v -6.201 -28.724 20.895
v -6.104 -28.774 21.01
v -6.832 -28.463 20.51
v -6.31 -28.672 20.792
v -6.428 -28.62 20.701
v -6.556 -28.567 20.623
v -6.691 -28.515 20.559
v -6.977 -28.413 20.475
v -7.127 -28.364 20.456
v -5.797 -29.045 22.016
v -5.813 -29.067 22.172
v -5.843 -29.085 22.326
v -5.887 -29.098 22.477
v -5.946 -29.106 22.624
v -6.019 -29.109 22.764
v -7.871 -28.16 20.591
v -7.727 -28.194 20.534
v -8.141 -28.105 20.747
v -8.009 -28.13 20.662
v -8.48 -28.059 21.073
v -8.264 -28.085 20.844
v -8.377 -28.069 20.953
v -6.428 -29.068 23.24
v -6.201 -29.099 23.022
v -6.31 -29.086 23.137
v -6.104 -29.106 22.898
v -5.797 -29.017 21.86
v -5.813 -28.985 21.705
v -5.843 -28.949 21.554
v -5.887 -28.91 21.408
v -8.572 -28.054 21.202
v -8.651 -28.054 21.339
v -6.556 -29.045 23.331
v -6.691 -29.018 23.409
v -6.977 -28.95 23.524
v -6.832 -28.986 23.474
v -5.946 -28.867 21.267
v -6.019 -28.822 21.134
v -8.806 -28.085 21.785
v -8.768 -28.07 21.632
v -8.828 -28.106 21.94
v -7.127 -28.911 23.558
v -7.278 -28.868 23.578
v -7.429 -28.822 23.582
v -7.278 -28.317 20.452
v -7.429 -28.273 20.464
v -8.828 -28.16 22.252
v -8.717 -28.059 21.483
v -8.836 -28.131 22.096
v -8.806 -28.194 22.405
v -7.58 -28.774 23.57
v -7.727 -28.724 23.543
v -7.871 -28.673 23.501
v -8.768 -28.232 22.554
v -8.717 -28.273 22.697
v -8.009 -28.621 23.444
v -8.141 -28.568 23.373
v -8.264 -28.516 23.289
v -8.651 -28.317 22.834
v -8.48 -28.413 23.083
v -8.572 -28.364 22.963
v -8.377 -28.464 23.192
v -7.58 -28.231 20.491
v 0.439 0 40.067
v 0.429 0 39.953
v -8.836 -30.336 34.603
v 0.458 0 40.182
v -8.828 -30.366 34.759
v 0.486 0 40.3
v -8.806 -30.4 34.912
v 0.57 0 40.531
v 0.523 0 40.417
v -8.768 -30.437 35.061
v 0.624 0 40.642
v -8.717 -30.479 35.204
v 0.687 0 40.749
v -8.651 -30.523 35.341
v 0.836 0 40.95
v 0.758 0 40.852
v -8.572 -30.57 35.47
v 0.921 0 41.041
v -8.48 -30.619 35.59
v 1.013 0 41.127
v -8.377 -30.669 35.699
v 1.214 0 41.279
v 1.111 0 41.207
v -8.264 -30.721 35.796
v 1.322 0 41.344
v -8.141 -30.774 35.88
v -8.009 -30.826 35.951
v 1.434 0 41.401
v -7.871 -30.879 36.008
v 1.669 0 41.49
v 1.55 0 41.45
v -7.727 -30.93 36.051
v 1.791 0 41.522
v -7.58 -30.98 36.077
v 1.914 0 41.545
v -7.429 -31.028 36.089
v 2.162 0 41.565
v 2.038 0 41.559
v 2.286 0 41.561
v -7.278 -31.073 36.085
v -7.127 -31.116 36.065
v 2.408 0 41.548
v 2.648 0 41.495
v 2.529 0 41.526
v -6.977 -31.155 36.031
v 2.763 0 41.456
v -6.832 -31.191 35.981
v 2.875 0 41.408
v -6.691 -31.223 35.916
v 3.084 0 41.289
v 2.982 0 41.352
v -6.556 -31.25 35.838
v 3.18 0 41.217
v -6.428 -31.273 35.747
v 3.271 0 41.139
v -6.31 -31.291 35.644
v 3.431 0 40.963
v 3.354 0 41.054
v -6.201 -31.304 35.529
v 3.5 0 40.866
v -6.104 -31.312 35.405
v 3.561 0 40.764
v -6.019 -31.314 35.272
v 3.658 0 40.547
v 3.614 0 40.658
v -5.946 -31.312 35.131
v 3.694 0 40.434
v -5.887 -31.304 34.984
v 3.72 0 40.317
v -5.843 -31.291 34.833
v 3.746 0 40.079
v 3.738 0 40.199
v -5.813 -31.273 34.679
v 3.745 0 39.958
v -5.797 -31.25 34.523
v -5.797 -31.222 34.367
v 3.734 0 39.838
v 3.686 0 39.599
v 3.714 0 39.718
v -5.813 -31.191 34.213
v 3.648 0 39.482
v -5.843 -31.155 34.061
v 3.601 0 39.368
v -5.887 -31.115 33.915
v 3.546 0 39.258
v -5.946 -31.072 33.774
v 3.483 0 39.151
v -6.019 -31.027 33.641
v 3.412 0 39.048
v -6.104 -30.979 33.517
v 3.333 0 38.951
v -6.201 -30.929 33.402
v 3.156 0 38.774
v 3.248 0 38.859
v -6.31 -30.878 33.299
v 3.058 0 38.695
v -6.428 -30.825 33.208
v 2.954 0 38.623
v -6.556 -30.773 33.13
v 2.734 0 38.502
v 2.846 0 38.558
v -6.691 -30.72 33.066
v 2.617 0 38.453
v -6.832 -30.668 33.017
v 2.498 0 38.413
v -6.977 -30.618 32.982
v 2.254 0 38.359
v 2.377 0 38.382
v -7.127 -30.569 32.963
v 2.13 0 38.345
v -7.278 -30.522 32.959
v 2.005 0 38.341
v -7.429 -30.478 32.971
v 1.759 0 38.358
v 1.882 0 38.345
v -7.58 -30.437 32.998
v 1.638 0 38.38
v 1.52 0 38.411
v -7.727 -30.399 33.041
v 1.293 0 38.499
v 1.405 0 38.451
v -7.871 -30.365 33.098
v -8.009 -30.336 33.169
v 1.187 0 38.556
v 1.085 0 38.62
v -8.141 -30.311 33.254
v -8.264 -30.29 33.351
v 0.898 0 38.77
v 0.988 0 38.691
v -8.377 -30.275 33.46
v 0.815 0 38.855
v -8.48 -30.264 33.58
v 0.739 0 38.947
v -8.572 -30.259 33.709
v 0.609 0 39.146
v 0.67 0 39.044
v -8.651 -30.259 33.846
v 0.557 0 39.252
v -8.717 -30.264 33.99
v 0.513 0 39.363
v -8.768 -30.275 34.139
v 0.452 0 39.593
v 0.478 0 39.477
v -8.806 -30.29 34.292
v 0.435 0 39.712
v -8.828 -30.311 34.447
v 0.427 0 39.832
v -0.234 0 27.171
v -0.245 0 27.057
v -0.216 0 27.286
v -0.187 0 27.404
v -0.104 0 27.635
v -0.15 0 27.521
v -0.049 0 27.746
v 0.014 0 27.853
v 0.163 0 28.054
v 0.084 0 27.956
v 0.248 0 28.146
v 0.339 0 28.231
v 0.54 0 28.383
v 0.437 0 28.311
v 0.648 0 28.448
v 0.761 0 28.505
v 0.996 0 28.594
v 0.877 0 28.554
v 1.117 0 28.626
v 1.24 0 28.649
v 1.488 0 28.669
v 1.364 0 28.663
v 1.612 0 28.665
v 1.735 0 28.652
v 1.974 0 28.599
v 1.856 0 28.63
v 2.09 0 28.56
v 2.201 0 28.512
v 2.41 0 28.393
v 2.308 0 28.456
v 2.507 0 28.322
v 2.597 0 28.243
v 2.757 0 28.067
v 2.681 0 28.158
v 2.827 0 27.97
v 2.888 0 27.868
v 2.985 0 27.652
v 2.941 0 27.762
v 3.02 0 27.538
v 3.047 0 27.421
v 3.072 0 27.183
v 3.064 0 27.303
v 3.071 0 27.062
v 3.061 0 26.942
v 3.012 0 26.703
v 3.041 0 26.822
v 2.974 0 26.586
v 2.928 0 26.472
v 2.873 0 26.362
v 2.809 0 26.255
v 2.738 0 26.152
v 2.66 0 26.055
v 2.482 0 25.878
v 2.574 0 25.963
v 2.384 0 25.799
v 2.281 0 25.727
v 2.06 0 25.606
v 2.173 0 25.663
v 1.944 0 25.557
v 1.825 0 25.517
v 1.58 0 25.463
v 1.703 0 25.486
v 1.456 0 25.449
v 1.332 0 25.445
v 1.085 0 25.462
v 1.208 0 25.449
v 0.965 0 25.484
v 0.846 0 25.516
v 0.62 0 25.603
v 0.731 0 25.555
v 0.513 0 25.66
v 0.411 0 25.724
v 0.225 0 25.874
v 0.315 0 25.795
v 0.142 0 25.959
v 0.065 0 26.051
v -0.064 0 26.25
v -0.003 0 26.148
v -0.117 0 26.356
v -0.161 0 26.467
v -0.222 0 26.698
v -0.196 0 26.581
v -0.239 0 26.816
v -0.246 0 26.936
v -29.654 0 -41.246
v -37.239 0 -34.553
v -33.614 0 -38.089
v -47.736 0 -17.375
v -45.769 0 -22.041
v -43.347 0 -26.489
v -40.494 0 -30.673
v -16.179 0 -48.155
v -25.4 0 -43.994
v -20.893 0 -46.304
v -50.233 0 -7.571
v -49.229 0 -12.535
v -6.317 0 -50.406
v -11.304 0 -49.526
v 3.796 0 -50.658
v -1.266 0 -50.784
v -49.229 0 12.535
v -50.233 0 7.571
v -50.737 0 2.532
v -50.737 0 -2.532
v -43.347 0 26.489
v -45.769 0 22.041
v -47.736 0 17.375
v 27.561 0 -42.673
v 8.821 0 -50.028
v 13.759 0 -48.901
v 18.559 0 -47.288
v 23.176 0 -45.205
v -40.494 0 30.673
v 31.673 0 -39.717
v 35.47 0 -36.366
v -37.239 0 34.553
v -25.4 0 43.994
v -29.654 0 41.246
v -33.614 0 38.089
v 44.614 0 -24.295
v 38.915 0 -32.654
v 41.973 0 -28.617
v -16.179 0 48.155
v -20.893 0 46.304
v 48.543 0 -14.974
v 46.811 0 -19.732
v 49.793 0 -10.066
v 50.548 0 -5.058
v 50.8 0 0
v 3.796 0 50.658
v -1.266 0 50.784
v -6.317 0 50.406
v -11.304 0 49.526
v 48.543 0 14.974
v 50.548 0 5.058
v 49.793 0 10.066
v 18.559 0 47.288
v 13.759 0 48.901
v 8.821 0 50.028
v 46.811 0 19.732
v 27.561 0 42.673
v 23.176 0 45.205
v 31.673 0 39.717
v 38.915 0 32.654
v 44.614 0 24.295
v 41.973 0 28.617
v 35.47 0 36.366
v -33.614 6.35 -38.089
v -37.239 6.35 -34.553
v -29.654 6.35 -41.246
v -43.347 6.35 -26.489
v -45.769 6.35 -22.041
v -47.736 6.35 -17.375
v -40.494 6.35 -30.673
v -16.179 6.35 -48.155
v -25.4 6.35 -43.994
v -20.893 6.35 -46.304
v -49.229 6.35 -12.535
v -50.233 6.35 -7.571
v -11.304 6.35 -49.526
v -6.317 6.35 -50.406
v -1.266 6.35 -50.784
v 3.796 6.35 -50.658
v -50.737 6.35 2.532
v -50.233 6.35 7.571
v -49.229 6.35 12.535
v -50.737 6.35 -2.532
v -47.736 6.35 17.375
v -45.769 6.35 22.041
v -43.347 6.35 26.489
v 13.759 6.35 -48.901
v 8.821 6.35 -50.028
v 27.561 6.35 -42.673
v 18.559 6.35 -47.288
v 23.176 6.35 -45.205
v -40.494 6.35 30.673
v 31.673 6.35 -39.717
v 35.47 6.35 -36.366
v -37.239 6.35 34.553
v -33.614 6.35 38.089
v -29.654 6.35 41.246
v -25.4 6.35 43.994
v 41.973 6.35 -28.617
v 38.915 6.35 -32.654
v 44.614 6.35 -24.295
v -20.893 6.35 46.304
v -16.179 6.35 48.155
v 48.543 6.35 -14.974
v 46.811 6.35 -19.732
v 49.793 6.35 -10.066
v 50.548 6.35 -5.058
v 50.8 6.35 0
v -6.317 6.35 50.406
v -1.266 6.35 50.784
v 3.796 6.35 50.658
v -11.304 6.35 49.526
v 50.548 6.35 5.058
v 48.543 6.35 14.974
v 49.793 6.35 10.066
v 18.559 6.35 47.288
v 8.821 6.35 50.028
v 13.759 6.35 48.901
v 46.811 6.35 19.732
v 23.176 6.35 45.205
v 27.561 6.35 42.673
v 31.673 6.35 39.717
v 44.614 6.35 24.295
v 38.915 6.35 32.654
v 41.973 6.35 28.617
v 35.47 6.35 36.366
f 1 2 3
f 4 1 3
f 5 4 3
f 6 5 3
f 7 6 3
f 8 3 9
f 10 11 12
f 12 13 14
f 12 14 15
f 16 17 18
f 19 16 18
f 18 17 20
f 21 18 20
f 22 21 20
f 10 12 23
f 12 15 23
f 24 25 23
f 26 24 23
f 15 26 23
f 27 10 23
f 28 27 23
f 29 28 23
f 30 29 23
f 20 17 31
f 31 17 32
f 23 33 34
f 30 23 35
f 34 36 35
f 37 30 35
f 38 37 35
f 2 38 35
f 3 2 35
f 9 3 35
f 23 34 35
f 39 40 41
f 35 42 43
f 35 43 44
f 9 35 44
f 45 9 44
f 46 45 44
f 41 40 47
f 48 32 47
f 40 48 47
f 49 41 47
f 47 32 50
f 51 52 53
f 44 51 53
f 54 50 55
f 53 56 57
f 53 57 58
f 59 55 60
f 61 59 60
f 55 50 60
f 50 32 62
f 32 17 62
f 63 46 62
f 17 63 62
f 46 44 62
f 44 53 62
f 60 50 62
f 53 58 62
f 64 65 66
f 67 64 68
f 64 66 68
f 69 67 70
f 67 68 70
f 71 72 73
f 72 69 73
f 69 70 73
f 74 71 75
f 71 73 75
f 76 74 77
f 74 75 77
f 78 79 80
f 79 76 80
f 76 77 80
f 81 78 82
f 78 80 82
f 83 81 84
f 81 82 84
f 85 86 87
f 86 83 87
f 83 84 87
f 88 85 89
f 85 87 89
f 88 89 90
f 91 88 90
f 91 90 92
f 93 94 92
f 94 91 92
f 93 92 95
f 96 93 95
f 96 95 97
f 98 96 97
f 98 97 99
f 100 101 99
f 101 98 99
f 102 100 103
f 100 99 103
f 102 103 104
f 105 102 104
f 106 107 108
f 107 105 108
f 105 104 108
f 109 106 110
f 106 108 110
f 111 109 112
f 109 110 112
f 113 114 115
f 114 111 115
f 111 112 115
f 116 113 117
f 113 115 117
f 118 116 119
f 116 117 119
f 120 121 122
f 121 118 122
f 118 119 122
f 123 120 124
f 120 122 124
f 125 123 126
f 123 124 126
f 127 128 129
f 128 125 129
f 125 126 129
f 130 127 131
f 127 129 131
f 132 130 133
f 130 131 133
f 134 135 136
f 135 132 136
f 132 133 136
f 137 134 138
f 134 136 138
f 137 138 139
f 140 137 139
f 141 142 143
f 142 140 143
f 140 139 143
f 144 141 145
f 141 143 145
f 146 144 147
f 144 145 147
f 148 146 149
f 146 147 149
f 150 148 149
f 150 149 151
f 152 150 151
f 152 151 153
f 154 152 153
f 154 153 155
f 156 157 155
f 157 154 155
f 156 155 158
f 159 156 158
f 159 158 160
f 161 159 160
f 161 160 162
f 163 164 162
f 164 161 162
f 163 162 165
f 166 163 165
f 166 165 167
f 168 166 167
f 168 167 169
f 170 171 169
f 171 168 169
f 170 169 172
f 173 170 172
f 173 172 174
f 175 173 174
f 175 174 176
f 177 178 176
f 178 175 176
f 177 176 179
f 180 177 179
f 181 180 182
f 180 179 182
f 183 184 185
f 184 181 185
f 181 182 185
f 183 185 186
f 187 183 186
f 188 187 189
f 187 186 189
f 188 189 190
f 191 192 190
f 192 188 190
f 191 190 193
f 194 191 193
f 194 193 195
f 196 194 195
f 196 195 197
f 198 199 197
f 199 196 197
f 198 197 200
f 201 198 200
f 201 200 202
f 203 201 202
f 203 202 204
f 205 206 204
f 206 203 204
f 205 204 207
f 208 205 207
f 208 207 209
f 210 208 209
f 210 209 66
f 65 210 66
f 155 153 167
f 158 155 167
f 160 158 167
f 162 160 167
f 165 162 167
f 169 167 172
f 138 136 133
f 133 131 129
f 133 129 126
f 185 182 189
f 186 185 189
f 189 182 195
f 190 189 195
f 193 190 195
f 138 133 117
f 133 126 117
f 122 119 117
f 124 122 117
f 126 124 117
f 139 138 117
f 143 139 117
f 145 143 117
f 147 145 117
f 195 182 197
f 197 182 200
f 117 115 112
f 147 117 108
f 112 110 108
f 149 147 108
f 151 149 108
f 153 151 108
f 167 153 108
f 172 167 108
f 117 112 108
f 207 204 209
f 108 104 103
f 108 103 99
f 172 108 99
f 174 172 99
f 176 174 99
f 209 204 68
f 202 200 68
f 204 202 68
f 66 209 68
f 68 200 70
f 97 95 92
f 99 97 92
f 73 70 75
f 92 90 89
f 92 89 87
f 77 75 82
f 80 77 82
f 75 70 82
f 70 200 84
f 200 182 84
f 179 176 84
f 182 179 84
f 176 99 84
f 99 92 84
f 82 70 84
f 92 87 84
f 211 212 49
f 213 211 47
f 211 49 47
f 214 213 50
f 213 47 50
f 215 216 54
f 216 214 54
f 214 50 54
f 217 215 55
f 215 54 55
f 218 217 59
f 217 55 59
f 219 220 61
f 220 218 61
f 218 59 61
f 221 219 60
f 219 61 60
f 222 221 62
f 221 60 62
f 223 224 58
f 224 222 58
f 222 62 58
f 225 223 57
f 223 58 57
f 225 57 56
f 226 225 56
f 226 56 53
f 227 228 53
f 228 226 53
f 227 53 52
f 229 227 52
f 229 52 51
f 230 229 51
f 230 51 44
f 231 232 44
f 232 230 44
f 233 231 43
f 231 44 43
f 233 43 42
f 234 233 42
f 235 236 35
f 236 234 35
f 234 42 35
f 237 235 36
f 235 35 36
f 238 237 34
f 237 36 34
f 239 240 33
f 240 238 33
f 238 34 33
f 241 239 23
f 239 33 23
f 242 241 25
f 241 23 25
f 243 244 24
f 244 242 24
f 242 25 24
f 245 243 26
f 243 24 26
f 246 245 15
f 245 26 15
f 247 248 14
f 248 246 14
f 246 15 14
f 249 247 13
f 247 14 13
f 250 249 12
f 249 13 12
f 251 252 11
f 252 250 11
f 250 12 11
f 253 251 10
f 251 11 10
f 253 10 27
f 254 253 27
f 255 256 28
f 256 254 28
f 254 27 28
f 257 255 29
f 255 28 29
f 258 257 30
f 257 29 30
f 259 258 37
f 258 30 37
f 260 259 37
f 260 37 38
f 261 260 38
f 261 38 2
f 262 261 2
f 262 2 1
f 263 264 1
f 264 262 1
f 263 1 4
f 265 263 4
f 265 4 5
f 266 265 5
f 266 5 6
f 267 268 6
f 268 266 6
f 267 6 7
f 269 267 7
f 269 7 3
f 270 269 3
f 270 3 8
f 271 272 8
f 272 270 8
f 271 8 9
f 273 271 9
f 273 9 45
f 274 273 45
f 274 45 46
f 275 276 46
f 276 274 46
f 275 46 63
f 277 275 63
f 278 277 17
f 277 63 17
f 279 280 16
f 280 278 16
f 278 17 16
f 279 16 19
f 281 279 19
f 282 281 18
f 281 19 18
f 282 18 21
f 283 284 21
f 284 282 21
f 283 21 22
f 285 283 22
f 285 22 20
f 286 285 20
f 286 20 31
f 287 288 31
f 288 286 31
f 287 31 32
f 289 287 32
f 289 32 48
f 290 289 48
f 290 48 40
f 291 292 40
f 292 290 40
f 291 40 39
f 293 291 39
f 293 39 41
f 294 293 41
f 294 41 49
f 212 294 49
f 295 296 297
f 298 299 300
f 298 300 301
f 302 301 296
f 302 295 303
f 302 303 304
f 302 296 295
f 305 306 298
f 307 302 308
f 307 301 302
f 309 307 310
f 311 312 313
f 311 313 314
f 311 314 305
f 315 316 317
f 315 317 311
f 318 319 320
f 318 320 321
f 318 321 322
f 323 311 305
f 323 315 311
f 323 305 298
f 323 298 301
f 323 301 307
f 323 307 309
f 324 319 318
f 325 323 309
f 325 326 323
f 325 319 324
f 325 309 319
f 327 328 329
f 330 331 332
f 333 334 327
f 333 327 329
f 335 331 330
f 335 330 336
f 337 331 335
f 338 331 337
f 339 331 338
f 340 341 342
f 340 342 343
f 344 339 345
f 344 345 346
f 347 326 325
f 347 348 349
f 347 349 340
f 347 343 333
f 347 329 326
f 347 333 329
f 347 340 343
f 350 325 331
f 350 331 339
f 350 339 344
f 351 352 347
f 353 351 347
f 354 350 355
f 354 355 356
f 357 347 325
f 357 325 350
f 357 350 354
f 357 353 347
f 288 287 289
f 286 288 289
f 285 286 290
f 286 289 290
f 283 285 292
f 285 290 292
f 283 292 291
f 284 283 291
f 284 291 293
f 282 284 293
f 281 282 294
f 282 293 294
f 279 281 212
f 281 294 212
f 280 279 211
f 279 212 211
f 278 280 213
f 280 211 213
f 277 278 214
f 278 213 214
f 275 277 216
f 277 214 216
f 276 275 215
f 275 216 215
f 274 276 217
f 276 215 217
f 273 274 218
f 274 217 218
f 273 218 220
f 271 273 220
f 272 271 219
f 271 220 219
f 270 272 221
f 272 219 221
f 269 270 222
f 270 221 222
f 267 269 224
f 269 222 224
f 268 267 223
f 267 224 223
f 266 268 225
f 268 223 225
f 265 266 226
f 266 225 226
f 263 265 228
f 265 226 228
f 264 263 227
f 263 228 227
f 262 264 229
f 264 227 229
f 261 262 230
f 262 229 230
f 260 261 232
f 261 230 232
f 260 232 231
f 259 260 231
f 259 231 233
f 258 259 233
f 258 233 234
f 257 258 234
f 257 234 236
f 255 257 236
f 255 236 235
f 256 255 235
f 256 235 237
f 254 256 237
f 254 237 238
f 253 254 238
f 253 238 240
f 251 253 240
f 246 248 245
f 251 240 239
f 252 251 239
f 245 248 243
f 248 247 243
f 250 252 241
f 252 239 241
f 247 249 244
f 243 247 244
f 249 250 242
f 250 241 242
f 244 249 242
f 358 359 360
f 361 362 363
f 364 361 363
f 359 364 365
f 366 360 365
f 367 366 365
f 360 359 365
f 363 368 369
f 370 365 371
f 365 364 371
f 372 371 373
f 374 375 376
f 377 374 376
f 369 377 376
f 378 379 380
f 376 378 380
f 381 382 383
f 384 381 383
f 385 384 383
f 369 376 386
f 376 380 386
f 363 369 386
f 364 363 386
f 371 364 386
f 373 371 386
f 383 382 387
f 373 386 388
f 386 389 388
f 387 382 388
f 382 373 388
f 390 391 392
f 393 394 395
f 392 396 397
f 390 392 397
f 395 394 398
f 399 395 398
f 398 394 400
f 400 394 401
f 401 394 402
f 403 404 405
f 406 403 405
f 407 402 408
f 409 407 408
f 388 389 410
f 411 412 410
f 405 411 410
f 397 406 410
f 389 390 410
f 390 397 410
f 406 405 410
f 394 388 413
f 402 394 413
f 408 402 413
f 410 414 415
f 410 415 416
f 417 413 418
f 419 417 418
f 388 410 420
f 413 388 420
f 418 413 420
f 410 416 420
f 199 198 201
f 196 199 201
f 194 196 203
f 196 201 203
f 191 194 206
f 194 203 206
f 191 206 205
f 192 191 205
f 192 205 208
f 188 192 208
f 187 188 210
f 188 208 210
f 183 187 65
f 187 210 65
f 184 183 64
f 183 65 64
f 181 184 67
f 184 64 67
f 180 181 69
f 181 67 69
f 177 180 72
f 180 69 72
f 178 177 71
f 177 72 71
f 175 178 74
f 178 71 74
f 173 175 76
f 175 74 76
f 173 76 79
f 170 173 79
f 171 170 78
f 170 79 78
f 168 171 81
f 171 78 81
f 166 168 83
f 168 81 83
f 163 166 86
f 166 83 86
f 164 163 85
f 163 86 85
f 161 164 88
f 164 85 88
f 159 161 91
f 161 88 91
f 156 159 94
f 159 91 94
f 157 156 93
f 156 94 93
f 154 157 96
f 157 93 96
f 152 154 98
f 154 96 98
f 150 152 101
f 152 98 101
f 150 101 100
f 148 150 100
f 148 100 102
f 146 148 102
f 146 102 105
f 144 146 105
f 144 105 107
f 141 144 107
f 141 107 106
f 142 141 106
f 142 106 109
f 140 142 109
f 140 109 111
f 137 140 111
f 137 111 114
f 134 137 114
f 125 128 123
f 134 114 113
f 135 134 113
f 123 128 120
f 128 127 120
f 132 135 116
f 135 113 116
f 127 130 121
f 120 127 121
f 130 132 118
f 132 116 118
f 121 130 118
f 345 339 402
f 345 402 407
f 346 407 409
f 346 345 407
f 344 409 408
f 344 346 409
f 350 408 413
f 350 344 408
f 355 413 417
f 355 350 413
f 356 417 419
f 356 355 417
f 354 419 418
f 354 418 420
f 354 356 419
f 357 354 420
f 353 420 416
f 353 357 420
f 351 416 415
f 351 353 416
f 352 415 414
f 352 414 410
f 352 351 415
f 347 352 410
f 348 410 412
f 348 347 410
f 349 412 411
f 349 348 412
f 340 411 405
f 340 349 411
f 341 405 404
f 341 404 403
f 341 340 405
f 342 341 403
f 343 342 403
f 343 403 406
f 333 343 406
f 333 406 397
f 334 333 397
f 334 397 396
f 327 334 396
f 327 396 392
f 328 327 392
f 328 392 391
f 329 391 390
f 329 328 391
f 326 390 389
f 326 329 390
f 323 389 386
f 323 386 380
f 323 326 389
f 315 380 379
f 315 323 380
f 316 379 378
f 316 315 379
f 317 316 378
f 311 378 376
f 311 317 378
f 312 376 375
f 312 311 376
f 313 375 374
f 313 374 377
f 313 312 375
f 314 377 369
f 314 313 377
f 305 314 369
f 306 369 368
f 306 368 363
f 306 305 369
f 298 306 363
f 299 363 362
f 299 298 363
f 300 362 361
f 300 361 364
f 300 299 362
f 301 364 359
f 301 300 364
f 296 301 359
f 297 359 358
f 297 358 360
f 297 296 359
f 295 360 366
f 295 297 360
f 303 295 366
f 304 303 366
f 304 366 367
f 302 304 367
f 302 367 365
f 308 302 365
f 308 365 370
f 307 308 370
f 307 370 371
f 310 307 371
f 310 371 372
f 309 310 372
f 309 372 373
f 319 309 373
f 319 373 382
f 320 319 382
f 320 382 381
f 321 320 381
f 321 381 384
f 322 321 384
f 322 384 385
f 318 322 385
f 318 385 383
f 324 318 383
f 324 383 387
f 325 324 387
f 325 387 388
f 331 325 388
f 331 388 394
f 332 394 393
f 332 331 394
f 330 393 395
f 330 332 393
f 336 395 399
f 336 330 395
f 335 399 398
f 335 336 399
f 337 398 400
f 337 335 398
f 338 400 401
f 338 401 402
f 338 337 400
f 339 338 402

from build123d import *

# Parameters (mm, degrees)
F0_R     = 50.8
F1_DEPTH = 6.35
F5_R     = 1.5875


# Not quite as in the source:
# - a length typed as a fraction of an inch, garbled in the dataset ("3 / 203.2 mm" for 3/8 in), is restored


with BuildPart() as f1:
    # F0 (on Front) → F1 (new body)
    with BuildSketch(Plane.XZ):
        Circle(F0_R)
    extrude(amount=-F1_DEPTH)


with BuildPart() as f6:
    # F5 (on offset) → F6 (new body, up to the next surface of F1)
    with BuildSketch(Plane(origin=(-7.3157607037, -23.9541129475, -4.2237564116), x_dir=(-0.9576237697, 0.2836463724, 0.0500145084), z_dir=(0.2880220749, 0.9430753129, 0.1662896225))):
        with Locations((0, 26.6455678842)):
            Circle(F5_R)
    extrude(until=Until.NEXT, target=f1.part)


with BuildPart() as f6b:
    # F5 (on offset) → F6, piece 2 (new body, up to the next surface of F1)
    with BuildSketch(Plane(origin=(-7.3157607037, -23.9541129475, -4.2237564116), x_dir=(-0.9576237697, 0.2836463724, 0.0500145084), z_dir=(0.2880220749, 0.9430753129, 0.1662896225))):
        with Locations((0, 39.3455678842)):
            Circle(F5_R)
    extrude(until=Until.NEXT, target=f1.part)


solid = Compound([f1.part, f6.part, f6b.part])
